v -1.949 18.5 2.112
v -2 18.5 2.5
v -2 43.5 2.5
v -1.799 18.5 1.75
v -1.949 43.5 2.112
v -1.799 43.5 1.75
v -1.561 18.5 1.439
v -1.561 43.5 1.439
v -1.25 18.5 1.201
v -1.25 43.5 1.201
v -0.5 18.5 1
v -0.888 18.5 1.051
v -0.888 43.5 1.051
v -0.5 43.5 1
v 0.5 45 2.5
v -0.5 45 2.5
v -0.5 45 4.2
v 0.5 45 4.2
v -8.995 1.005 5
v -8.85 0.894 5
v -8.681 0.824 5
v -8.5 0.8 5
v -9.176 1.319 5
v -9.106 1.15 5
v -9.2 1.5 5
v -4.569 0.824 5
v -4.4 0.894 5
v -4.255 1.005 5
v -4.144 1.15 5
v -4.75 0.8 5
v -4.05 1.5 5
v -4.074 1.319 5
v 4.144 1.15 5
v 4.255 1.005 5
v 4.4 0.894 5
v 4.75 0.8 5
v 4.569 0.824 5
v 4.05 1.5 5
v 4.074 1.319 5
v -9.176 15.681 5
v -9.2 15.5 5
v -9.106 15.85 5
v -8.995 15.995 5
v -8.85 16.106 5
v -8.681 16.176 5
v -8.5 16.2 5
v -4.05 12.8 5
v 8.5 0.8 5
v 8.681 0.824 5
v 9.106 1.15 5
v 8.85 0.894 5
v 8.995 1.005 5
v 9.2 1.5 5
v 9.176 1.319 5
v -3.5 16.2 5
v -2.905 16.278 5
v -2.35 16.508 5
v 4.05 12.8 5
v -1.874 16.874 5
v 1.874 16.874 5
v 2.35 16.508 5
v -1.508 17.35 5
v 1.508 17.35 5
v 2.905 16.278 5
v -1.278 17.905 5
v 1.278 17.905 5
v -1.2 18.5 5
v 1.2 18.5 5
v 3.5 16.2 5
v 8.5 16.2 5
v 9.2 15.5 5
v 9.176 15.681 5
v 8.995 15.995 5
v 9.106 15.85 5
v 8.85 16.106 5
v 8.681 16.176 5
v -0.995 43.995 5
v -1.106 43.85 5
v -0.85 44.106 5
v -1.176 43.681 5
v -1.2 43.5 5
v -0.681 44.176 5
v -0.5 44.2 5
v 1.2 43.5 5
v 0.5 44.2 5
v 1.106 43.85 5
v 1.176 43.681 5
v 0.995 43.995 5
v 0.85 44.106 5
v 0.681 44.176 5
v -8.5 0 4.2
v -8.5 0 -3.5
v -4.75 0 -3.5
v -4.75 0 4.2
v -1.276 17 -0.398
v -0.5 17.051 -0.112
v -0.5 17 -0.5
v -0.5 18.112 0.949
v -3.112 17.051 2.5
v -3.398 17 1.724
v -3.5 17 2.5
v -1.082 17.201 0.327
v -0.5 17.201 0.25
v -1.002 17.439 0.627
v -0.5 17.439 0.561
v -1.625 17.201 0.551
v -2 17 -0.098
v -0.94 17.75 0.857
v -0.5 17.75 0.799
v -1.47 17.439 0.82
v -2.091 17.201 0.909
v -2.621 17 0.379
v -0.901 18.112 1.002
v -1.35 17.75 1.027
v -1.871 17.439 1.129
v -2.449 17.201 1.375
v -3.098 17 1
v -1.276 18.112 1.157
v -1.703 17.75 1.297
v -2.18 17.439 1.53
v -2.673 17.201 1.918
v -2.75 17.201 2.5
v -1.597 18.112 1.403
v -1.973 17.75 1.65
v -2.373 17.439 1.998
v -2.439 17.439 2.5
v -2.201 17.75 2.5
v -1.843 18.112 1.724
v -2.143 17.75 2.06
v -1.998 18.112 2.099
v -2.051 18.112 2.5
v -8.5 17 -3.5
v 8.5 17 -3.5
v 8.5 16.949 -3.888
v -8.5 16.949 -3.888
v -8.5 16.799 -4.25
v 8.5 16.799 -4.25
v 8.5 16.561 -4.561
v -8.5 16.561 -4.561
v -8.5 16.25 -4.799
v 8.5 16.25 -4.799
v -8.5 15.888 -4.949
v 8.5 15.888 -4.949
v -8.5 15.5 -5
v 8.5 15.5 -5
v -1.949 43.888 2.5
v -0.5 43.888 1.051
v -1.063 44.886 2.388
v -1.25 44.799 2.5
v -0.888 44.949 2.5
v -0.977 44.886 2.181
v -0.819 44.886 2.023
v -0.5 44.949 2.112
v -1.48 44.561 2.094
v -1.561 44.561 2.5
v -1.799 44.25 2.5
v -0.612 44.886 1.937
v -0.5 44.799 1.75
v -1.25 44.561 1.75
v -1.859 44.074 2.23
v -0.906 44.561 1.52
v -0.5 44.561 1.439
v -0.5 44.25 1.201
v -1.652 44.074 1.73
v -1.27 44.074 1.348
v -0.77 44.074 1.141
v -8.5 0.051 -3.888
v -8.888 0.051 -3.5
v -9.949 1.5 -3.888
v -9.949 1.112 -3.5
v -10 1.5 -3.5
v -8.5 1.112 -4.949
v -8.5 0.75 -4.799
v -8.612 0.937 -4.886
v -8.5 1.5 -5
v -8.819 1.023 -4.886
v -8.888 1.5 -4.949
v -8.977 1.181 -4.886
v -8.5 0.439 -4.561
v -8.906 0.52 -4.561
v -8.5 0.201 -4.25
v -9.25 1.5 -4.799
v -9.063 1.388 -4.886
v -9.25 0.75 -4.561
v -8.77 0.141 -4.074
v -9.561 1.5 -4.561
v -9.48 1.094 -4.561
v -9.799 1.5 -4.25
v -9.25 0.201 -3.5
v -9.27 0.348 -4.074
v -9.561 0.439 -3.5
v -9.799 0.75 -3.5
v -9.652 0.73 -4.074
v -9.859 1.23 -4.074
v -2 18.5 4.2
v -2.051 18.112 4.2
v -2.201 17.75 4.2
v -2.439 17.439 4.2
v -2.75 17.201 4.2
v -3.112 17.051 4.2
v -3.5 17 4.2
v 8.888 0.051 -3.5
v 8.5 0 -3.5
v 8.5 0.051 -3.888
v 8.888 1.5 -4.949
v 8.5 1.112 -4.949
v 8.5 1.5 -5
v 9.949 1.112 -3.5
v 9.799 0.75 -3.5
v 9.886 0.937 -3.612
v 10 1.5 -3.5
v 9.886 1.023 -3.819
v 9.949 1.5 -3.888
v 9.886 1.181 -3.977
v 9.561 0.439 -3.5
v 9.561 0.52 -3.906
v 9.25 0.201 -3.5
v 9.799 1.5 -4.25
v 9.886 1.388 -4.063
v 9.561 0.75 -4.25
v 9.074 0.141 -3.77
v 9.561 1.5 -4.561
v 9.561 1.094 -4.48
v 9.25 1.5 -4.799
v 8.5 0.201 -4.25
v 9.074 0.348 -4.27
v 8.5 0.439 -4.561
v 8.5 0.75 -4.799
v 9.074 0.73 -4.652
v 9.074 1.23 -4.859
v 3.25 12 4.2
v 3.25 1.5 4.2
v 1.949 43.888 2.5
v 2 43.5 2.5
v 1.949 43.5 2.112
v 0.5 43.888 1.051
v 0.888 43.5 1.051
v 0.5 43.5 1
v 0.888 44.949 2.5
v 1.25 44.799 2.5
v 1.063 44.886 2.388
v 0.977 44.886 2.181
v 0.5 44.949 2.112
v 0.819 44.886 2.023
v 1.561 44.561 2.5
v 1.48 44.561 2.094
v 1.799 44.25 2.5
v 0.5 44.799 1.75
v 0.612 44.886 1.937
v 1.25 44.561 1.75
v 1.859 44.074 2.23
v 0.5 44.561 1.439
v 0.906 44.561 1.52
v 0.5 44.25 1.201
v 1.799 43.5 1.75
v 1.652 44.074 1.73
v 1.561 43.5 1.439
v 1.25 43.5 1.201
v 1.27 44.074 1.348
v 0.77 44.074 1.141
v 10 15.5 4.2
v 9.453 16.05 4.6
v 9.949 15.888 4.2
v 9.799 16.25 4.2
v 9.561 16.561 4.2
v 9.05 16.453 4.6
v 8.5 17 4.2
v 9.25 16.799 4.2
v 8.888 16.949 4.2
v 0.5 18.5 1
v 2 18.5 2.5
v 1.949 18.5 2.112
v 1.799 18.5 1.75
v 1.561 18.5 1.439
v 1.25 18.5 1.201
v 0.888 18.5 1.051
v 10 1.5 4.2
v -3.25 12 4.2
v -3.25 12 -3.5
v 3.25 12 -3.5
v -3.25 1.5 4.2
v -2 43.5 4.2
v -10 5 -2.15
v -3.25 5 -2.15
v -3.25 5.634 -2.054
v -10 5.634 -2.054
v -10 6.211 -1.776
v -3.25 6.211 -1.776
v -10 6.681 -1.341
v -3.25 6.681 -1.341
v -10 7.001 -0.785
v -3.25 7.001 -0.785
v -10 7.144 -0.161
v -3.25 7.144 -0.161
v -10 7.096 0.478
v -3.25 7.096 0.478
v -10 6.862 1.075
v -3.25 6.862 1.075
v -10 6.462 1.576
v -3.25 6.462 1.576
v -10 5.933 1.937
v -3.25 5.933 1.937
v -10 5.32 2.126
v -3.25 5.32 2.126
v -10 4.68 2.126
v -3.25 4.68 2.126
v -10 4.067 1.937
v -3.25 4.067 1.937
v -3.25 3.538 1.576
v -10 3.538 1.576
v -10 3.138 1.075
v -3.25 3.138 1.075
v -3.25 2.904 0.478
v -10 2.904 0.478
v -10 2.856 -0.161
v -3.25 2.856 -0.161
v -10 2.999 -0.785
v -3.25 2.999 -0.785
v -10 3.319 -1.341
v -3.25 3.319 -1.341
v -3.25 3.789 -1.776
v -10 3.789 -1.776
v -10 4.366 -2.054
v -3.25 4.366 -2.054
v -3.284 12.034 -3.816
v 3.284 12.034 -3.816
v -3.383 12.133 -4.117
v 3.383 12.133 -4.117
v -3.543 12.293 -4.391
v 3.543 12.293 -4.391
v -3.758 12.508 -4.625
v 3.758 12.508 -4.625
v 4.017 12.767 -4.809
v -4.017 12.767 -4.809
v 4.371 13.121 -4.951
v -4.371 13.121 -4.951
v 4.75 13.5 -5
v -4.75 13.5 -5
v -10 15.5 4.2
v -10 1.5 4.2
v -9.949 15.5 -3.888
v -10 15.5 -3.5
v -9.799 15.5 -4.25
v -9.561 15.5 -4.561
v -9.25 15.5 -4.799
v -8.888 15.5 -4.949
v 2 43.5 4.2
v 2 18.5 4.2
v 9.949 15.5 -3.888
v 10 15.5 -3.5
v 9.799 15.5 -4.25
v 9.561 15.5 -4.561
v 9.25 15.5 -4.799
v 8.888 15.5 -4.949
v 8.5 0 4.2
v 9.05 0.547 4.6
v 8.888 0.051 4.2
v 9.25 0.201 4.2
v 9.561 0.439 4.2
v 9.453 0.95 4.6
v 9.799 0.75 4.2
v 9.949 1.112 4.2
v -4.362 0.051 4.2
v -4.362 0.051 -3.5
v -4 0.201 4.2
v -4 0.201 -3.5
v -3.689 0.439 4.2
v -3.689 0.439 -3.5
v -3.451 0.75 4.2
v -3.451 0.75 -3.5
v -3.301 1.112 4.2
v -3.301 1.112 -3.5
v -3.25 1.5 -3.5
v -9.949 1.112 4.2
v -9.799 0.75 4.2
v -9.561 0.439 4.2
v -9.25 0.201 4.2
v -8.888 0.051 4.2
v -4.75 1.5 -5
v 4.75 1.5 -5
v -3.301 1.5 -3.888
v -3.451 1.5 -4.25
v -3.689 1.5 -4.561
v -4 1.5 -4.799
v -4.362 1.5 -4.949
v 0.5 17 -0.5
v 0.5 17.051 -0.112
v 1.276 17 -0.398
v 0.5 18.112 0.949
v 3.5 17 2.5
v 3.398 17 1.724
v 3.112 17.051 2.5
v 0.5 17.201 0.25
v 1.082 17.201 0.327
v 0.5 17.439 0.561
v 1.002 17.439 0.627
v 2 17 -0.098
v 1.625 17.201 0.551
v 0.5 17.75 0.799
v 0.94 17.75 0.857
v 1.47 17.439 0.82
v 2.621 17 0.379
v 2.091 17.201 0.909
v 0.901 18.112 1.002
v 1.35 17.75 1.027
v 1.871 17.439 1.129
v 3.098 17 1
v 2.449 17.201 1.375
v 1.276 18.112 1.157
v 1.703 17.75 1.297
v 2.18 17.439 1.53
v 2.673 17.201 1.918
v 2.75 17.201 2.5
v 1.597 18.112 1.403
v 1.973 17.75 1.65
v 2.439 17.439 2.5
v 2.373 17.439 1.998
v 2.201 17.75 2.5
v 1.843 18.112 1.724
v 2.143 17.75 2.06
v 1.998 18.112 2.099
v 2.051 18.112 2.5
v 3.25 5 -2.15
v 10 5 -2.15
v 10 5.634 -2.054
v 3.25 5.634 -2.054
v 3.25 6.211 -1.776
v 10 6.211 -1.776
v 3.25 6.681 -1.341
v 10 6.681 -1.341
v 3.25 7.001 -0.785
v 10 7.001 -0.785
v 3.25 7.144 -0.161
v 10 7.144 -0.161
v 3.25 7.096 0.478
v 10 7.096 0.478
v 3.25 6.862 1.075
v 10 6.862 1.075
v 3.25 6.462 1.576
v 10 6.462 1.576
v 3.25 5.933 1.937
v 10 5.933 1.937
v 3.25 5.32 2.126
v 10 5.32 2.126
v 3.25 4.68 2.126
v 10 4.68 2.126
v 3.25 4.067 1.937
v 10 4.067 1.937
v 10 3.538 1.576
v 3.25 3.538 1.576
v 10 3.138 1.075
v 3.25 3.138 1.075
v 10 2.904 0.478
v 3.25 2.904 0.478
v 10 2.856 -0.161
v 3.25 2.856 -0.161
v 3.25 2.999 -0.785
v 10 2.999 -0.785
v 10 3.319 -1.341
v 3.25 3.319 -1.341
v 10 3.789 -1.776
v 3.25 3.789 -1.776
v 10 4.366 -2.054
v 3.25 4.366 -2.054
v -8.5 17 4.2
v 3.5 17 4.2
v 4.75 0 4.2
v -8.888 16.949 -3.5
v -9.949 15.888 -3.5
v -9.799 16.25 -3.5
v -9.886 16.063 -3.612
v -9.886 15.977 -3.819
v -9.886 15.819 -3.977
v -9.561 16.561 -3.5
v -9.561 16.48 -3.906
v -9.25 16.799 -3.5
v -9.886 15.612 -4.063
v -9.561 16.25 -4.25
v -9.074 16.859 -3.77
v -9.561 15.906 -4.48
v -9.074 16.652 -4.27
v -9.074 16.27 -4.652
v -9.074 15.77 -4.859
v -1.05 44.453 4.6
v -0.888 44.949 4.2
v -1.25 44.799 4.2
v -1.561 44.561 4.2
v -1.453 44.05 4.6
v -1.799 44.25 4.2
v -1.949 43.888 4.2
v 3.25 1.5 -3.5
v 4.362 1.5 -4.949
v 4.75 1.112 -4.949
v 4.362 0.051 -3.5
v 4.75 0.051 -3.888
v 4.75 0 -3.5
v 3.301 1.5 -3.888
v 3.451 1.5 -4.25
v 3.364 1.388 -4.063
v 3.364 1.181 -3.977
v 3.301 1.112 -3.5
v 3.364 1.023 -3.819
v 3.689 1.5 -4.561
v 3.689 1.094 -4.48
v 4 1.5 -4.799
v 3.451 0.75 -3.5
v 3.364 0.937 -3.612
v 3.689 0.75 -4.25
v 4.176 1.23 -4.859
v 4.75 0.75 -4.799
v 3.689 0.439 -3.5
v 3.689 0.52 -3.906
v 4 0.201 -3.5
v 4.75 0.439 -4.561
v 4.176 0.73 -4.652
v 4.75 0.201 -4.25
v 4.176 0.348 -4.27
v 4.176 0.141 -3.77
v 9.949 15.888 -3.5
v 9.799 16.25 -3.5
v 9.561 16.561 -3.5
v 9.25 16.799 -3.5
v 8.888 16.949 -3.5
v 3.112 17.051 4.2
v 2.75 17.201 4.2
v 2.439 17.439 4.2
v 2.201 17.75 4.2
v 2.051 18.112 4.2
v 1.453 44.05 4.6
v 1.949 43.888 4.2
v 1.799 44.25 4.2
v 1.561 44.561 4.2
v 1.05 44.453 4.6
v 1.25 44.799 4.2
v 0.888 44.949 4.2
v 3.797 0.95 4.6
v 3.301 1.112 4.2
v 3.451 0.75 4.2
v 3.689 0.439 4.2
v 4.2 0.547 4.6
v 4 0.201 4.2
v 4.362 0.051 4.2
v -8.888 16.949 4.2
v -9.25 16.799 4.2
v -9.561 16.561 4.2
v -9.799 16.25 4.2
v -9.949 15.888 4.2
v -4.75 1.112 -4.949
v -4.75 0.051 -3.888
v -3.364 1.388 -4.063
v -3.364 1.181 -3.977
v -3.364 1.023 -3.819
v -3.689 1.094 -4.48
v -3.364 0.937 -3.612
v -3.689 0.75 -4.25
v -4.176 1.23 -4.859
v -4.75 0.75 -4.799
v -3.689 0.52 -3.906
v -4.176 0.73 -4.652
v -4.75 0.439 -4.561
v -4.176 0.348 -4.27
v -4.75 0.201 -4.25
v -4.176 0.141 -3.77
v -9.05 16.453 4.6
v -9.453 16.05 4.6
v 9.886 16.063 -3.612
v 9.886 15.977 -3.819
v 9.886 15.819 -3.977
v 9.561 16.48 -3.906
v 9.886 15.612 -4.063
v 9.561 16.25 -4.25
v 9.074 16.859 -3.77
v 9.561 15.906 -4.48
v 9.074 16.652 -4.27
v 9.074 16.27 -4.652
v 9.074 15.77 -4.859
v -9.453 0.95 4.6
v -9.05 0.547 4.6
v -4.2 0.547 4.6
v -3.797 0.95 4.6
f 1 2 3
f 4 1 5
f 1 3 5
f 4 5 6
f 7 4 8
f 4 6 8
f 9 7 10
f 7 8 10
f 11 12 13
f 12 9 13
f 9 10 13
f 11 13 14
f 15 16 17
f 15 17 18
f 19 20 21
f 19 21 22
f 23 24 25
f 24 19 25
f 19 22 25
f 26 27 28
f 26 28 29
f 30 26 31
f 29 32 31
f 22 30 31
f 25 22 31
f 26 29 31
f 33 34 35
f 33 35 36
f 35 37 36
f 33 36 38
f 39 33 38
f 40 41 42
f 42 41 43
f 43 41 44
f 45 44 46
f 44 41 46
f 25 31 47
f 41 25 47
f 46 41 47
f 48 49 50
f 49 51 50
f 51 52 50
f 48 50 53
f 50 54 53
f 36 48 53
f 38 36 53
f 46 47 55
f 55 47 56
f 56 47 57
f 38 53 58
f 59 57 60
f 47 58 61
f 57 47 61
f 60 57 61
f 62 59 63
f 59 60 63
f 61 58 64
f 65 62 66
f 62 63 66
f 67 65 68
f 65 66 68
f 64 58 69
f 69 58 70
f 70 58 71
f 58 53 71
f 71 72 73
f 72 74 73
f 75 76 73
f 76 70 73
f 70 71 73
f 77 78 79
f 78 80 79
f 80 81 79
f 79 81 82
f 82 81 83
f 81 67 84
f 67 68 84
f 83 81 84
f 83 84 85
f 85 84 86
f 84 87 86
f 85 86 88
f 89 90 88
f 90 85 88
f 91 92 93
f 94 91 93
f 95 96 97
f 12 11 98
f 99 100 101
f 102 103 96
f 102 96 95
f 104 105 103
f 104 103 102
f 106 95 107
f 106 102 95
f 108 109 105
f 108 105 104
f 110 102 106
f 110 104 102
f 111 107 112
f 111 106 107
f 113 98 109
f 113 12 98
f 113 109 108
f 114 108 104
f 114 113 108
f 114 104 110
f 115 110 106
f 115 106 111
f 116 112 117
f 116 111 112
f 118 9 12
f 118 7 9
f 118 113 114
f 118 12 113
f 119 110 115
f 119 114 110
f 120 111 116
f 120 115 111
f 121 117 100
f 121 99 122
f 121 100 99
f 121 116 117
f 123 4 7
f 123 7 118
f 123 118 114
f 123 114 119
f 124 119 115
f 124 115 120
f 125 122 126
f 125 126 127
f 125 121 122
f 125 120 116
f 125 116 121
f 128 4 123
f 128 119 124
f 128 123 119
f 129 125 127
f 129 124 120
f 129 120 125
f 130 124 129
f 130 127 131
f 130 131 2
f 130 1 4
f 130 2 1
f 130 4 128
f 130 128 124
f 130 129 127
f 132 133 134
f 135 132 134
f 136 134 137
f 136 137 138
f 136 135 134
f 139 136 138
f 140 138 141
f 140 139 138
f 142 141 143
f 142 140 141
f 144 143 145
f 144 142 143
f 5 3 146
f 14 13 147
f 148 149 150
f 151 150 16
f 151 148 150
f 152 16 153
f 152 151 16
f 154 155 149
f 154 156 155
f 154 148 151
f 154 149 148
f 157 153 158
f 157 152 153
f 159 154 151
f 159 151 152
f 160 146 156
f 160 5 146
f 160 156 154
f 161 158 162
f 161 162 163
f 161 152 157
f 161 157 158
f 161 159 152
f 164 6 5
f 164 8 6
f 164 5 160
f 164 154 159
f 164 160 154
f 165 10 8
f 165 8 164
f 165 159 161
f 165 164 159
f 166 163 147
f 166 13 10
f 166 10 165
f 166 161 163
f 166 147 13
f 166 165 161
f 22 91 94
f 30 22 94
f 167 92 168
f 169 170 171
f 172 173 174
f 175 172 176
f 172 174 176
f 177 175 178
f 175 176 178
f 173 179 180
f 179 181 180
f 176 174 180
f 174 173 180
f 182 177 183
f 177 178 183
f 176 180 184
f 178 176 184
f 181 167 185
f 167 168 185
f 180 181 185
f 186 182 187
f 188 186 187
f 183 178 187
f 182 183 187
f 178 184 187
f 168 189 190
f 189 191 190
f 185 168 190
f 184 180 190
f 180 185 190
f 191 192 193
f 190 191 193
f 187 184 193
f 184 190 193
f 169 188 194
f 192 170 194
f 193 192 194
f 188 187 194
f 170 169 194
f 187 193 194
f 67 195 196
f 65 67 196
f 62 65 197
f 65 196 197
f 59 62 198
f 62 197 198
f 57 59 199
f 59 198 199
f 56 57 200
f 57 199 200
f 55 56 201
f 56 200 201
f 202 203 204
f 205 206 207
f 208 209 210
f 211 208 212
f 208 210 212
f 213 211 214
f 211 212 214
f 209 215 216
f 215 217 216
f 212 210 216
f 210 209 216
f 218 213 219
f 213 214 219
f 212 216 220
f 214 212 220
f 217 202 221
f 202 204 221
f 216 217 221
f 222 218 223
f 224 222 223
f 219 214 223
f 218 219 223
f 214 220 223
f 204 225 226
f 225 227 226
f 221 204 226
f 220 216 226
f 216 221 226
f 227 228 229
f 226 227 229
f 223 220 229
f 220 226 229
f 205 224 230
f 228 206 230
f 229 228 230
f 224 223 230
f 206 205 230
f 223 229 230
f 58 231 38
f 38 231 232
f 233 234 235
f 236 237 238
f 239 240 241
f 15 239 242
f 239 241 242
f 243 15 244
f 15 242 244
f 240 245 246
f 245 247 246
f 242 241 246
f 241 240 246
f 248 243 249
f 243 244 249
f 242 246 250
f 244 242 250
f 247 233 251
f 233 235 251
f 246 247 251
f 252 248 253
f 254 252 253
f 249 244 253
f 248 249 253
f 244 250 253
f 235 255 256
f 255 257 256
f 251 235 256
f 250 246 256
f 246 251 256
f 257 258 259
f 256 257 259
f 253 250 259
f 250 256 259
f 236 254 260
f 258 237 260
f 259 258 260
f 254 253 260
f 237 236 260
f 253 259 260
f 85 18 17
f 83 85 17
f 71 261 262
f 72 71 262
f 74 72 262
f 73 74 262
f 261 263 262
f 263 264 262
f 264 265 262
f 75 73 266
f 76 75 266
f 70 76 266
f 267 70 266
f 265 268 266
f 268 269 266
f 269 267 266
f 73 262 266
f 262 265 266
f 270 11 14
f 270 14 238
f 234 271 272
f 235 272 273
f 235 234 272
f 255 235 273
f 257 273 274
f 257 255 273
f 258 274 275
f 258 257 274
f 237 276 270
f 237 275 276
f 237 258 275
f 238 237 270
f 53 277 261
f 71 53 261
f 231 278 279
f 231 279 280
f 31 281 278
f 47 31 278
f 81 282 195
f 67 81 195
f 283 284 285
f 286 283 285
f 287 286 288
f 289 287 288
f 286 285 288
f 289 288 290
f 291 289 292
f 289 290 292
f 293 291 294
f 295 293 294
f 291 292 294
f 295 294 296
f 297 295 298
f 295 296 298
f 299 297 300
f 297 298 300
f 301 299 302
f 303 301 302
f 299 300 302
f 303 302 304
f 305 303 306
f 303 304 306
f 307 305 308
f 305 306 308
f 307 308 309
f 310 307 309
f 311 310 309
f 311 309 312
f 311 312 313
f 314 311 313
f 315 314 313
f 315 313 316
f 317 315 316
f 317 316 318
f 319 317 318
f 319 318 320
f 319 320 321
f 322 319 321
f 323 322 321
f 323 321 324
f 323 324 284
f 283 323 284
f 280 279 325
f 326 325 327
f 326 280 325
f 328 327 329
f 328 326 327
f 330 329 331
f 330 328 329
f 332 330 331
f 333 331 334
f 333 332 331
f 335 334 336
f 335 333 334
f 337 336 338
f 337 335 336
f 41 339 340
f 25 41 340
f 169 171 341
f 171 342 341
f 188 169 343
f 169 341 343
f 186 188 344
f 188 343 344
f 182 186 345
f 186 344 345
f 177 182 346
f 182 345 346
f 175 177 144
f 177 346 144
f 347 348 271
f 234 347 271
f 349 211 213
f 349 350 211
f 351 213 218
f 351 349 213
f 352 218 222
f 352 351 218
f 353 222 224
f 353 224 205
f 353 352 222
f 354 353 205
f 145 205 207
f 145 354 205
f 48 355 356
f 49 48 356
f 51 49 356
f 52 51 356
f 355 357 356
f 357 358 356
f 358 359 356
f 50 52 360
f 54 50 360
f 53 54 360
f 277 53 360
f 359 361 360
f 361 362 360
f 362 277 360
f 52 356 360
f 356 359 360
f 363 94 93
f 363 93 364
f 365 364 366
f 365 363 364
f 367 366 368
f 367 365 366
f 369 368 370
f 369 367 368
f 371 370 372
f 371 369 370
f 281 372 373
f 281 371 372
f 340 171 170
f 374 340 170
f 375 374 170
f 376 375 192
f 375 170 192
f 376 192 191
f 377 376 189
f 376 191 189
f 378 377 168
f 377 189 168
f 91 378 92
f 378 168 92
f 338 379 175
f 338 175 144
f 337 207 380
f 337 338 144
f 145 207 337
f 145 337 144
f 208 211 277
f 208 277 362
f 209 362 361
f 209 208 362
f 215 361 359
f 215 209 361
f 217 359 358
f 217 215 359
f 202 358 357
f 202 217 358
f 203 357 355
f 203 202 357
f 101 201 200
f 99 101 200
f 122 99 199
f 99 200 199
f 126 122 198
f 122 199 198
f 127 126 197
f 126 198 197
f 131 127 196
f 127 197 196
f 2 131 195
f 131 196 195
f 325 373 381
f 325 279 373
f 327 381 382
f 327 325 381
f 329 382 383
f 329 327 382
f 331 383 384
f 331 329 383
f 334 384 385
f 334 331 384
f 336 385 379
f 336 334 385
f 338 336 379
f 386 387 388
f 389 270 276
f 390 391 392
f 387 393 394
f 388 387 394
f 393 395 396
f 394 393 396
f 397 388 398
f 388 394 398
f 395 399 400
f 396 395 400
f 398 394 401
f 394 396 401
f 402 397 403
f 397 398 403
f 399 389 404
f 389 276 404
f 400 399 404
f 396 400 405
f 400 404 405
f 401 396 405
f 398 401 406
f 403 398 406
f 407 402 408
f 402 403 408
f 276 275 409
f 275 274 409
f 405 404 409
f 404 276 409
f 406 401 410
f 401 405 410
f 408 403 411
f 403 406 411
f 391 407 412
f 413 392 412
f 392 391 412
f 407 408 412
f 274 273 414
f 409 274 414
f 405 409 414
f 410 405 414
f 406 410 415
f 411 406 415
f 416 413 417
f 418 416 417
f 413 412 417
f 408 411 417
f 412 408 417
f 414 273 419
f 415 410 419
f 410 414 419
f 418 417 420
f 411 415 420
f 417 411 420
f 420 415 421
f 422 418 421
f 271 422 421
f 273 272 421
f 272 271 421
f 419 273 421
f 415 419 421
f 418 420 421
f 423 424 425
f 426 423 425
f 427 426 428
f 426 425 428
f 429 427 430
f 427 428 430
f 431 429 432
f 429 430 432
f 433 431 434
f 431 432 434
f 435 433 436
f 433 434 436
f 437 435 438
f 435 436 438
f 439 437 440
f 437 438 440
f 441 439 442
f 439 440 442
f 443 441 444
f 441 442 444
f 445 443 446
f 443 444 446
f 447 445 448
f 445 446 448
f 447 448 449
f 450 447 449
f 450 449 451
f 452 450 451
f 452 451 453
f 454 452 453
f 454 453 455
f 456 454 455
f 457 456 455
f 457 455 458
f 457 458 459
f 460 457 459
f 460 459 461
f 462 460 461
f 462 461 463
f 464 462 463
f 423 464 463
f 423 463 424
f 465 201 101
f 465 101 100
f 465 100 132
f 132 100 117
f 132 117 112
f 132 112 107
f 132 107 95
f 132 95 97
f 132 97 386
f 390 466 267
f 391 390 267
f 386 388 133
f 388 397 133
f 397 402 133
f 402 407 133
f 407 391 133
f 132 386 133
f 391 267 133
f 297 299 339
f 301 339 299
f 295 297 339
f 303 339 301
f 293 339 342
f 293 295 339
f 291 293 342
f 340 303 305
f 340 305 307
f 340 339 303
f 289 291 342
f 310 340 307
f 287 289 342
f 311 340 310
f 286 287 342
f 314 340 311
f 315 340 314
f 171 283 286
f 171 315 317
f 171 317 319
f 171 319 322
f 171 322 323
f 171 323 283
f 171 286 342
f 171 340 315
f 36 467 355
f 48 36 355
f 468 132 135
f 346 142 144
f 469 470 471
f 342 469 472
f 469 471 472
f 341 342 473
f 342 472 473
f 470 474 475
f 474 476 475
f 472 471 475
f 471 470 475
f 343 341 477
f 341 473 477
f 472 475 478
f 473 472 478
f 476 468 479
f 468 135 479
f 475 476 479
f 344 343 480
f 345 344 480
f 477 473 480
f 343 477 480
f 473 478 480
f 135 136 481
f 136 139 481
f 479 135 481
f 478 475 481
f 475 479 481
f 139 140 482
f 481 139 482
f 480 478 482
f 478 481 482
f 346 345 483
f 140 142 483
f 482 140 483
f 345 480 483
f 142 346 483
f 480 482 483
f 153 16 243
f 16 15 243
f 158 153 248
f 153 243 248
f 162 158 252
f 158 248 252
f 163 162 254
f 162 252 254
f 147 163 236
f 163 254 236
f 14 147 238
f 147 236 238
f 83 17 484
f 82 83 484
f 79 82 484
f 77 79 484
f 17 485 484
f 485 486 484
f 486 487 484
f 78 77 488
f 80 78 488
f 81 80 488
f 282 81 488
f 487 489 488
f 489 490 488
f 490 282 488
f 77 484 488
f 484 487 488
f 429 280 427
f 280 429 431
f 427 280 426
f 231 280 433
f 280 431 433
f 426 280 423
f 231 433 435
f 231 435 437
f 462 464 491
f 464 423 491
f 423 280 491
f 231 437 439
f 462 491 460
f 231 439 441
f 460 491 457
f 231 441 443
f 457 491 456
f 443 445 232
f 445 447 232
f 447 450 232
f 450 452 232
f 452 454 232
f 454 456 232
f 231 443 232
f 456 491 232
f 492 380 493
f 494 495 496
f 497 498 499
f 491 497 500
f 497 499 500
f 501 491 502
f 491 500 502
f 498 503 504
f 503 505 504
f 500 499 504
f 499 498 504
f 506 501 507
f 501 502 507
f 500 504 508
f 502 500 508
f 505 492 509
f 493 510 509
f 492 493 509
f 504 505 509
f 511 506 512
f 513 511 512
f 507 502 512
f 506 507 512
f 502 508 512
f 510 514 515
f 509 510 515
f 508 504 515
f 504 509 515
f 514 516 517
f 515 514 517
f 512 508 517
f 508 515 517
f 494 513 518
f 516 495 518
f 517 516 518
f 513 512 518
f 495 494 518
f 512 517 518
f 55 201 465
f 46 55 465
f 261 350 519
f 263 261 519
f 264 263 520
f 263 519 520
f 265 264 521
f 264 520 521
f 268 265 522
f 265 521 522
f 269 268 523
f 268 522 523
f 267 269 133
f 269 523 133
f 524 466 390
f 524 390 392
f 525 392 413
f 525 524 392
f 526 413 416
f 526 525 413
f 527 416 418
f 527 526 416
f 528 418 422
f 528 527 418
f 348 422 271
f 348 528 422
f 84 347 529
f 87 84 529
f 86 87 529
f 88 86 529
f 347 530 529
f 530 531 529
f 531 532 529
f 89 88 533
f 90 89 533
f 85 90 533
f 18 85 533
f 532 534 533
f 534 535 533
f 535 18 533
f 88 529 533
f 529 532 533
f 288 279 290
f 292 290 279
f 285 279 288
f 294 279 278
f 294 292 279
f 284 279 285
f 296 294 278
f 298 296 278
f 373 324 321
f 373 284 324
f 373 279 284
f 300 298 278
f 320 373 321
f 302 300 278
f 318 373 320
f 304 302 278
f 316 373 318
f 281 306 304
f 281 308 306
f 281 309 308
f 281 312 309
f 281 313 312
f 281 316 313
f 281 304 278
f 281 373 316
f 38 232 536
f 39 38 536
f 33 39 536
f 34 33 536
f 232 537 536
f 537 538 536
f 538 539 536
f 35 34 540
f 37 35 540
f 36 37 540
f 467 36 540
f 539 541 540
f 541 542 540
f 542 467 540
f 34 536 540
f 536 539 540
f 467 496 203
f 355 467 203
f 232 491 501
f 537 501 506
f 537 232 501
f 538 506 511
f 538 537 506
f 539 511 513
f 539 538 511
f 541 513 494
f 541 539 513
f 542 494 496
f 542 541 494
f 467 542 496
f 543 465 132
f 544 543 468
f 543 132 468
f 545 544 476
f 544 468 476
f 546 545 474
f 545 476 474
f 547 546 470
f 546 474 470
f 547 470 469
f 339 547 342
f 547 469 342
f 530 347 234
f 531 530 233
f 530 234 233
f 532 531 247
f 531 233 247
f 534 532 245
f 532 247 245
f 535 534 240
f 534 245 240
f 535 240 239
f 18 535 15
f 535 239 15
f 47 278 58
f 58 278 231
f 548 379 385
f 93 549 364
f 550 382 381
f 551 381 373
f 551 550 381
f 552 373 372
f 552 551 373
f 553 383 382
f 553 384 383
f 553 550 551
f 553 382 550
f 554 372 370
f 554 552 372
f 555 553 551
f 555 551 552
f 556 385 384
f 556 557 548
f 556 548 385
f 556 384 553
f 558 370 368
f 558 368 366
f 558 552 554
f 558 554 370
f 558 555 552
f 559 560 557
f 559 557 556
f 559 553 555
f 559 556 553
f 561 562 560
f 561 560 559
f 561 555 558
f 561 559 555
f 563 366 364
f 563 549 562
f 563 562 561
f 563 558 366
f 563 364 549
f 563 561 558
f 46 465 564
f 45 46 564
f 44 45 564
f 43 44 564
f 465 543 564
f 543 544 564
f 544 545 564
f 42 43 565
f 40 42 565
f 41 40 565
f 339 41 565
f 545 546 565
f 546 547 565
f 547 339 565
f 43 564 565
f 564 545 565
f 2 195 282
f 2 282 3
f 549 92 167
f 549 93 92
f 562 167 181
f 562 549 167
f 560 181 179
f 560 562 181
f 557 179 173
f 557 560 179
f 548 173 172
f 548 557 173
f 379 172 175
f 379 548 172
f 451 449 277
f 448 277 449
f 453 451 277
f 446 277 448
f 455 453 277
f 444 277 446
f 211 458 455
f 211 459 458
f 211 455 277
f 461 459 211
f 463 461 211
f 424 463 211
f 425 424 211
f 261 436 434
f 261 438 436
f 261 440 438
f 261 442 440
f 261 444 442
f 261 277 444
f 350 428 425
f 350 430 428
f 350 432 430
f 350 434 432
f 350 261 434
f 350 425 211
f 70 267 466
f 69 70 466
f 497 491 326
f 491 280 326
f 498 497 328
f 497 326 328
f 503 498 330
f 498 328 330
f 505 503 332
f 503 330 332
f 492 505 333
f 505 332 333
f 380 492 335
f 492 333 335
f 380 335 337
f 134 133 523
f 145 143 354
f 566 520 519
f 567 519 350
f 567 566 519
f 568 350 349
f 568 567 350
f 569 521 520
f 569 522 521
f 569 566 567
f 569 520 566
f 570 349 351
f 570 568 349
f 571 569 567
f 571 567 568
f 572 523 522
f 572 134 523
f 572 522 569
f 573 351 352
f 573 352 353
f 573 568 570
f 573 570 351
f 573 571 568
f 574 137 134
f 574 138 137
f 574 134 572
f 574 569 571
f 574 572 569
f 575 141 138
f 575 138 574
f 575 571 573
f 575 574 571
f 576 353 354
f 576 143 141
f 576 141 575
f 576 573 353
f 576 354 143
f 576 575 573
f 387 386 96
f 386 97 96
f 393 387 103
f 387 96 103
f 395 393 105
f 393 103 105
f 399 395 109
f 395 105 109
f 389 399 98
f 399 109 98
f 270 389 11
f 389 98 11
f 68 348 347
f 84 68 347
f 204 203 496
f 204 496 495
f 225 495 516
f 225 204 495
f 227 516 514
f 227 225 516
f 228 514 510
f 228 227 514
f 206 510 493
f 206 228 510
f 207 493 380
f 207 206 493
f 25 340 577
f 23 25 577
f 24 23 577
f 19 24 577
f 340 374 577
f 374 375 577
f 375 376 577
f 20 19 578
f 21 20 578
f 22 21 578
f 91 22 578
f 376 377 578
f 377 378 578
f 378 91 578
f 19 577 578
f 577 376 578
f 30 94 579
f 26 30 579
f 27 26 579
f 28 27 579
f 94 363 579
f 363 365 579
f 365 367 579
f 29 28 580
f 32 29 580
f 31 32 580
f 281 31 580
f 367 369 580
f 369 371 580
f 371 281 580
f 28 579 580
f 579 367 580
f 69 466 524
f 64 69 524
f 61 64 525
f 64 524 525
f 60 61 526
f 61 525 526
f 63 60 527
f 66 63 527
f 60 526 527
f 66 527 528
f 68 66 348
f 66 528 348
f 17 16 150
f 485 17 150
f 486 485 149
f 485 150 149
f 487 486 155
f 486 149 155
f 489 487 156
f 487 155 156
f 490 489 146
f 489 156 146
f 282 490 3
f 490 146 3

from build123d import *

# Parameters (mm, degrees)
SKETCH1_W           = 20
SKETCH1_H           = 10
BOSS_EXTRUDE1_DEPTH = 10
SKETCH2_R           = 2.15
CUT_EXTRUDE1_DEPTH  = 23.912878475
SKETCH3_W           = 4
SKETCH3_H           = 4
BOSS_EXTRUDE2_DEPTH = 35
BOSS_EXTRUDE3_REACH = 51.497
SKETCH4_W           = 10
SKETCH4_H           = 7
SKETCH5_W           = 6.5
SKETCH5_H           = 10
CUT_EXTRUDE2_DEPTH  = 12
FILLET1_R           = 1.5
CHAMFER1_SIZE       = 0.8


with BuildPart() as part:
    # Sketch1 → Boss-Extrude1 (new body)
    with BuildSketch(Plane(origin=(0, 0, 0), x_dir=(1, 0, 0), z_dir=(0, 1, 0))):
        Rectangle(SKETCH1_W, SKETCH1_H)
    extrude(amount=BOSS_EXTRUDE1_DEPTH)

    # Sketch2 → Cut-Extrude1 (cut, through all)
    with BuildSketch(Plane(origin=(10, 0, 0), x_dir=(0, 0, -1), z_dir=(1, 0, 0))):
        with Locations((0, 5)):
            Circle(SKETCH2_R)
    extrude(amount=-CUT_EXTRUDE1_DEPTH, mode=Mode.SUBTRACT)

    # Sketch3 → Boss-Extrude2 (add)
    with BuildSketch(Plane(origin=(0, 10, 0), x_dir=(1, 0, 0), z_dir=(0, 1, 0))):
        with Locations((0, -3)):
            Rectangle(SKETCH3_W, SKETCH3_H)
    extrude(amount=BOSS_EXTRUDE2_DEPTH)

    # Boss-Extrude3: up to this face of the body (flat: up to its plane)
    boss_extrude3_end = Plane(part.part.faces().sort_by_distance((-10, 5, -4.858578644))[0])
    # Sketch4 → Boss-Extrude3 (add, up to the picked face)
    with BuildSketch(Plane(origin=(10, 0, 0), x_dir=(0, 0, -1), z_dir=(1, 0, 0)), mode=Mode.PRIVATE) as boss_extrude3_sk1:
        with Locations((0, 13.5)):
            Rectangle(SKETCH4_W, SKETCH4_H)
    boss_extrude3_tool1 = split(extrude(boss_extrude3_sk1.sketch, amount=-BOSS_EXTRUDE3_REACH, mode=Mode.PRIVATE), bisect_by=boss_extrude3_end, keep=Keep.BOTH, mode=Mode.PRIVATE)
    add(boss_extrude3_tool1.solids().sort_by(Axis((10, 13.5, 0), (-1, 0, 0)))[0])

    # Sketch5 → Cut-Extrude2 (cut)
    with BuildSketch(Plane.XZ):
        Rectangle(SKETCH5_W, SKETCH5_H)
    extrude(amount=-CUT_EXTRUDE2_DEPTH, mode=Mode.SUBTRACT)

    # Fillet1
    fillet1_edges = [part.edges().sort_by_distance(p)[0] for p in [
        (-2, 31, 1),
        (2, 31, 1),
        (-2, 45, 3),
        (2, 45, 3),
        (0, 45, 1),
        (0, 17, 1),
        (-2, 17, 3),
        (2, 17, 3),
        (0, 17, -5),
        (10, 17, 0),
        (-10, 17, 0),
        (-10, 0, 0),
        (-6.625, 0, -5),
        (6.625, 0, -5),
        (-3.25, 6, -5),
        (10, 0, 0),
        (0, 12, -5),
        (3.25, 6, -5),
        (-3.25, 0, 0),
        (3.25, 0, 0),
        (-10, 8.5, -5),
        (10, 8.5, -5),
    ]]
    fillet(fillet1_edges, radius=FILLET1_R)

    # Chamfer1
    chamfer1_edges = [part.edges().sort_by_distance(p)[0] for p in [
        (-6.625, 0, 5),
        (-9.560660172, 16.560660172, 5),
        (9.560660172, 16.560660172, 5),
        (-9.560660172, 0.439339828, 5),
        (9.560660172, 0.439339828, 5),
        (3.689339828, 0.439339828, 5),
        (-3.689339828, 0.439339828, 5),
        (-1.560660172, 44.560660172, 5),
        (1.560660172, 44.560660172, 5),
        (-2.439339828, 17.439339828, 5),
        (2.439339828, 17.439339828, 5),
        (3.25, 6.75, 5),
        (0, 12, 5),
        (-3.25, 6.75, 5),
        (-2, 31, 5),
        (6, 17, 5),
        (-6, 17, 5),
        (2, 31, 5),
        (0, 45, 5),
        (6.625, 0, 5),
        (10, 8.5, 5),
        (-10, 8.5, 5),
    ]]
    chamfer(chamfer1_edges, length=CHAMFER1_SIZE)


solid = part.part
